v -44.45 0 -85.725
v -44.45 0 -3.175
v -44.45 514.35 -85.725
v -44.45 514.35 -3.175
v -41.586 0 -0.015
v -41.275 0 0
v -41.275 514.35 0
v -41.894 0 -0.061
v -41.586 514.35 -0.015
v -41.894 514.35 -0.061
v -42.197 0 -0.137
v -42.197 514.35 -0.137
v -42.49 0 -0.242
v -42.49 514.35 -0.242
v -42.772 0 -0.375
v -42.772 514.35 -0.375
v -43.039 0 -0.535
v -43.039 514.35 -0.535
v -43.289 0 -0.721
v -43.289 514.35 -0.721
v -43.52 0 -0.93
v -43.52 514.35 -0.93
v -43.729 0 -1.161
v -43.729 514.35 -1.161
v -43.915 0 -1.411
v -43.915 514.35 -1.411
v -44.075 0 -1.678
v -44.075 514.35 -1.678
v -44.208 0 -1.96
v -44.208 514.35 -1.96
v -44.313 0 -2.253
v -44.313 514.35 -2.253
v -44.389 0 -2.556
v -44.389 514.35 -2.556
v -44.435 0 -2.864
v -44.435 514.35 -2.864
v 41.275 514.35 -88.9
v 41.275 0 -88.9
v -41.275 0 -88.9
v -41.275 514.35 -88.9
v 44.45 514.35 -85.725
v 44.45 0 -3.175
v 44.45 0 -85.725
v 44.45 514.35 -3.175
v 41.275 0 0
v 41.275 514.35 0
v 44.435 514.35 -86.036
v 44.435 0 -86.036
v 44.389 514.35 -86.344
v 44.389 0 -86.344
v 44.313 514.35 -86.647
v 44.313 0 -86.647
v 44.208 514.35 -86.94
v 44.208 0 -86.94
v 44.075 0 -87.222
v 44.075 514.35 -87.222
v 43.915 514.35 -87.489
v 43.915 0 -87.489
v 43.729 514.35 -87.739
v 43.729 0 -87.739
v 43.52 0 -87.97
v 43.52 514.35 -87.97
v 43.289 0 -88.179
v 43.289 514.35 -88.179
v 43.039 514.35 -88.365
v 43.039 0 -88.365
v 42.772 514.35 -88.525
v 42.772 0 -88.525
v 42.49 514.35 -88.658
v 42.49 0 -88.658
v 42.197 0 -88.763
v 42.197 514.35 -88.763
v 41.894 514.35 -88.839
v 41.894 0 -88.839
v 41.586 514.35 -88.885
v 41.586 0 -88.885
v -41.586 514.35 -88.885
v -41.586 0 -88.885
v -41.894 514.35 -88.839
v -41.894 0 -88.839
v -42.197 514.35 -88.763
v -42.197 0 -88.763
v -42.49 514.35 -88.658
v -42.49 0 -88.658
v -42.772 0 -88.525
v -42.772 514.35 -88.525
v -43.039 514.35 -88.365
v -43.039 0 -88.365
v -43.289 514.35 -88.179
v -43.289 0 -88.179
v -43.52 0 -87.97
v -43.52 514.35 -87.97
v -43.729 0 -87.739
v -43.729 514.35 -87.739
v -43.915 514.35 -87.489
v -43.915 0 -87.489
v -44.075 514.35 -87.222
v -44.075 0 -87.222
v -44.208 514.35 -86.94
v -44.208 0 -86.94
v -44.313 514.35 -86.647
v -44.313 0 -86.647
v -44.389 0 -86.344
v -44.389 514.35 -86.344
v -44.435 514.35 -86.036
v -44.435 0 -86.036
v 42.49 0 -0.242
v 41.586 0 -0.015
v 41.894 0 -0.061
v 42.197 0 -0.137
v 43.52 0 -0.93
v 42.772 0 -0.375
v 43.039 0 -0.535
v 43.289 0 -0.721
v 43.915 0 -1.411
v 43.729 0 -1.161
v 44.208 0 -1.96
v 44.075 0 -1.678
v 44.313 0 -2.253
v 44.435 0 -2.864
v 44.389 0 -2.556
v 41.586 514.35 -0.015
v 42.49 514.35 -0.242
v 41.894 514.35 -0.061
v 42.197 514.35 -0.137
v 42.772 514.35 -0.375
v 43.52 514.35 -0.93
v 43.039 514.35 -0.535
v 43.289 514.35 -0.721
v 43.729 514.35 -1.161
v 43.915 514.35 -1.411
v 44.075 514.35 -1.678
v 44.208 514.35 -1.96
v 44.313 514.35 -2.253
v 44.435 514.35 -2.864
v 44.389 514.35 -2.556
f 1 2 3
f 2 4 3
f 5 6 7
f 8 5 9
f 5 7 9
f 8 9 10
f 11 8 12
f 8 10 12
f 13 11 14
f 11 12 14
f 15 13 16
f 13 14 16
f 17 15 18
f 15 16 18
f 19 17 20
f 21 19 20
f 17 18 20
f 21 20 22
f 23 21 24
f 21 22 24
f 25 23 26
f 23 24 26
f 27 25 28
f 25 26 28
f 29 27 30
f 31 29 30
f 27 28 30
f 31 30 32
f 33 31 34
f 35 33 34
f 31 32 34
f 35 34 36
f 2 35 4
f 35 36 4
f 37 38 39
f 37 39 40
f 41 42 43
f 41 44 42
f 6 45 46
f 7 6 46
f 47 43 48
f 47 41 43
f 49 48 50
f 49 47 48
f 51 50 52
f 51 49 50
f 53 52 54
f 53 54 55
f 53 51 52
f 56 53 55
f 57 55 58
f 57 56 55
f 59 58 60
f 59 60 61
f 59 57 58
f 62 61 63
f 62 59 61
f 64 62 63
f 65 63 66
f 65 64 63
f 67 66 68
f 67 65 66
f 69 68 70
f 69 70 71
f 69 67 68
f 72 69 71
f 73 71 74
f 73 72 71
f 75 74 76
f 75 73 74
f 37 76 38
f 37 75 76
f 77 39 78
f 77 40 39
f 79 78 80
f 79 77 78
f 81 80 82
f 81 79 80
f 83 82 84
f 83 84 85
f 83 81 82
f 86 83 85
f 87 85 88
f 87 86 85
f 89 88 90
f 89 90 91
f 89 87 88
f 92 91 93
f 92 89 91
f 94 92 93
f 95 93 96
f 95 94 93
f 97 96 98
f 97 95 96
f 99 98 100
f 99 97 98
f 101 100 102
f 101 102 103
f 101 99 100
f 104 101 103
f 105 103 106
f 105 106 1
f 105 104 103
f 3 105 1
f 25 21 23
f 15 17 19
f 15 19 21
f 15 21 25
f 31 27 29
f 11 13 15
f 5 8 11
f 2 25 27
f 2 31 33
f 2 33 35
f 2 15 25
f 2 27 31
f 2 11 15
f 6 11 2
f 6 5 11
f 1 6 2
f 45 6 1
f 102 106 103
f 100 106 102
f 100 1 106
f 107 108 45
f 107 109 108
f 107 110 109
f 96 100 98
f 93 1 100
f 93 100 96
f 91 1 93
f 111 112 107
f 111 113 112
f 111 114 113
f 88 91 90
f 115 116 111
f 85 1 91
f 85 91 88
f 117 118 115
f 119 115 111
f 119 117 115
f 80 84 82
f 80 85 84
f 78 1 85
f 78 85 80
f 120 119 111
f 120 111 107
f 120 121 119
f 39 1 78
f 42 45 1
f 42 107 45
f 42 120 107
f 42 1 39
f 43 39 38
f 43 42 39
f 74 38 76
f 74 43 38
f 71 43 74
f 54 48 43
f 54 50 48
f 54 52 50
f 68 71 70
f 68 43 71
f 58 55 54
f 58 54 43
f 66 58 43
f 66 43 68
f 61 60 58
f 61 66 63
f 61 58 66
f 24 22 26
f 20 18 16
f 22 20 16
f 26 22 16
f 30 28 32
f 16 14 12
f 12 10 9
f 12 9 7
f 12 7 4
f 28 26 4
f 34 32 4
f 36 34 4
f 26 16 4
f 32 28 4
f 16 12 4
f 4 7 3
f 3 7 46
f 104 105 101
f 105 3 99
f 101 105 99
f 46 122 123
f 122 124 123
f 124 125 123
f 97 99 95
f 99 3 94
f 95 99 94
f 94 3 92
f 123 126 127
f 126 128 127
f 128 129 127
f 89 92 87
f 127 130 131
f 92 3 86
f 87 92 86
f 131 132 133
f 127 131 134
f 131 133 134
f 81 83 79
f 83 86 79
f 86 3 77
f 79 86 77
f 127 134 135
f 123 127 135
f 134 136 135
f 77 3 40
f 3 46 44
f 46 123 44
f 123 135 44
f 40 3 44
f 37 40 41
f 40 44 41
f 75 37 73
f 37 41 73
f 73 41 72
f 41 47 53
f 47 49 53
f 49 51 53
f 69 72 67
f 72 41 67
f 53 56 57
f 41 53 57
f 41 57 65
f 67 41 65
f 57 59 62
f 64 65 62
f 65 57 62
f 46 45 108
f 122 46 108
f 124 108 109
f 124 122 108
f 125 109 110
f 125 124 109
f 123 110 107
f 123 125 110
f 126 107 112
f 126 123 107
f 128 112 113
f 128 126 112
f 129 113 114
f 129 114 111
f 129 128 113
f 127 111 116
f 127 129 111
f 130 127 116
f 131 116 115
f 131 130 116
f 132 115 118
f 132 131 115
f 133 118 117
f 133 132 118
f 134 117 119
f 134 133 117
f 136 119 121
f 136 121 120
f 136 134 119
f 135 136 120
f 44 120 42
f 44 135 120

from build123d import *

# Parameters (mm, degrees)
SKETCH1_W           = 88.9
SKETCH1_H           = 514.35
BOSS_EXTRUDE1_DEPTH = 44.45
FILLET1_R           = 3.175


with BuildPart() as part:
    # Sketch1 → Boss-Extrude1 (new, symmetric)
    with BuildSketch(Plane(origin=(0, 0, 0), x_dir=(0, 0, -1), z_dir=(1, 0, 0))):
        with Locations((44.45, 257.175)):
            Rectangle(SKETCH1_W, SKETCH1_H)
    extrude(amount=BOSS_EXTRUDE1_DEPTH, both=True)

    # Fillet1
    fillet1_edges = [part.edges().sort_by_distance(p)[0] for p in [
        (44.45, 257.175, 0),
        (-44.45, 257.175, 0),
        (-44.45, 257.175, -88.9),
        (44.45, 257.175, -88.9),
    ]]
    fillet(fillet1_edges, radius=FILLET1_R)


solid = part.part
